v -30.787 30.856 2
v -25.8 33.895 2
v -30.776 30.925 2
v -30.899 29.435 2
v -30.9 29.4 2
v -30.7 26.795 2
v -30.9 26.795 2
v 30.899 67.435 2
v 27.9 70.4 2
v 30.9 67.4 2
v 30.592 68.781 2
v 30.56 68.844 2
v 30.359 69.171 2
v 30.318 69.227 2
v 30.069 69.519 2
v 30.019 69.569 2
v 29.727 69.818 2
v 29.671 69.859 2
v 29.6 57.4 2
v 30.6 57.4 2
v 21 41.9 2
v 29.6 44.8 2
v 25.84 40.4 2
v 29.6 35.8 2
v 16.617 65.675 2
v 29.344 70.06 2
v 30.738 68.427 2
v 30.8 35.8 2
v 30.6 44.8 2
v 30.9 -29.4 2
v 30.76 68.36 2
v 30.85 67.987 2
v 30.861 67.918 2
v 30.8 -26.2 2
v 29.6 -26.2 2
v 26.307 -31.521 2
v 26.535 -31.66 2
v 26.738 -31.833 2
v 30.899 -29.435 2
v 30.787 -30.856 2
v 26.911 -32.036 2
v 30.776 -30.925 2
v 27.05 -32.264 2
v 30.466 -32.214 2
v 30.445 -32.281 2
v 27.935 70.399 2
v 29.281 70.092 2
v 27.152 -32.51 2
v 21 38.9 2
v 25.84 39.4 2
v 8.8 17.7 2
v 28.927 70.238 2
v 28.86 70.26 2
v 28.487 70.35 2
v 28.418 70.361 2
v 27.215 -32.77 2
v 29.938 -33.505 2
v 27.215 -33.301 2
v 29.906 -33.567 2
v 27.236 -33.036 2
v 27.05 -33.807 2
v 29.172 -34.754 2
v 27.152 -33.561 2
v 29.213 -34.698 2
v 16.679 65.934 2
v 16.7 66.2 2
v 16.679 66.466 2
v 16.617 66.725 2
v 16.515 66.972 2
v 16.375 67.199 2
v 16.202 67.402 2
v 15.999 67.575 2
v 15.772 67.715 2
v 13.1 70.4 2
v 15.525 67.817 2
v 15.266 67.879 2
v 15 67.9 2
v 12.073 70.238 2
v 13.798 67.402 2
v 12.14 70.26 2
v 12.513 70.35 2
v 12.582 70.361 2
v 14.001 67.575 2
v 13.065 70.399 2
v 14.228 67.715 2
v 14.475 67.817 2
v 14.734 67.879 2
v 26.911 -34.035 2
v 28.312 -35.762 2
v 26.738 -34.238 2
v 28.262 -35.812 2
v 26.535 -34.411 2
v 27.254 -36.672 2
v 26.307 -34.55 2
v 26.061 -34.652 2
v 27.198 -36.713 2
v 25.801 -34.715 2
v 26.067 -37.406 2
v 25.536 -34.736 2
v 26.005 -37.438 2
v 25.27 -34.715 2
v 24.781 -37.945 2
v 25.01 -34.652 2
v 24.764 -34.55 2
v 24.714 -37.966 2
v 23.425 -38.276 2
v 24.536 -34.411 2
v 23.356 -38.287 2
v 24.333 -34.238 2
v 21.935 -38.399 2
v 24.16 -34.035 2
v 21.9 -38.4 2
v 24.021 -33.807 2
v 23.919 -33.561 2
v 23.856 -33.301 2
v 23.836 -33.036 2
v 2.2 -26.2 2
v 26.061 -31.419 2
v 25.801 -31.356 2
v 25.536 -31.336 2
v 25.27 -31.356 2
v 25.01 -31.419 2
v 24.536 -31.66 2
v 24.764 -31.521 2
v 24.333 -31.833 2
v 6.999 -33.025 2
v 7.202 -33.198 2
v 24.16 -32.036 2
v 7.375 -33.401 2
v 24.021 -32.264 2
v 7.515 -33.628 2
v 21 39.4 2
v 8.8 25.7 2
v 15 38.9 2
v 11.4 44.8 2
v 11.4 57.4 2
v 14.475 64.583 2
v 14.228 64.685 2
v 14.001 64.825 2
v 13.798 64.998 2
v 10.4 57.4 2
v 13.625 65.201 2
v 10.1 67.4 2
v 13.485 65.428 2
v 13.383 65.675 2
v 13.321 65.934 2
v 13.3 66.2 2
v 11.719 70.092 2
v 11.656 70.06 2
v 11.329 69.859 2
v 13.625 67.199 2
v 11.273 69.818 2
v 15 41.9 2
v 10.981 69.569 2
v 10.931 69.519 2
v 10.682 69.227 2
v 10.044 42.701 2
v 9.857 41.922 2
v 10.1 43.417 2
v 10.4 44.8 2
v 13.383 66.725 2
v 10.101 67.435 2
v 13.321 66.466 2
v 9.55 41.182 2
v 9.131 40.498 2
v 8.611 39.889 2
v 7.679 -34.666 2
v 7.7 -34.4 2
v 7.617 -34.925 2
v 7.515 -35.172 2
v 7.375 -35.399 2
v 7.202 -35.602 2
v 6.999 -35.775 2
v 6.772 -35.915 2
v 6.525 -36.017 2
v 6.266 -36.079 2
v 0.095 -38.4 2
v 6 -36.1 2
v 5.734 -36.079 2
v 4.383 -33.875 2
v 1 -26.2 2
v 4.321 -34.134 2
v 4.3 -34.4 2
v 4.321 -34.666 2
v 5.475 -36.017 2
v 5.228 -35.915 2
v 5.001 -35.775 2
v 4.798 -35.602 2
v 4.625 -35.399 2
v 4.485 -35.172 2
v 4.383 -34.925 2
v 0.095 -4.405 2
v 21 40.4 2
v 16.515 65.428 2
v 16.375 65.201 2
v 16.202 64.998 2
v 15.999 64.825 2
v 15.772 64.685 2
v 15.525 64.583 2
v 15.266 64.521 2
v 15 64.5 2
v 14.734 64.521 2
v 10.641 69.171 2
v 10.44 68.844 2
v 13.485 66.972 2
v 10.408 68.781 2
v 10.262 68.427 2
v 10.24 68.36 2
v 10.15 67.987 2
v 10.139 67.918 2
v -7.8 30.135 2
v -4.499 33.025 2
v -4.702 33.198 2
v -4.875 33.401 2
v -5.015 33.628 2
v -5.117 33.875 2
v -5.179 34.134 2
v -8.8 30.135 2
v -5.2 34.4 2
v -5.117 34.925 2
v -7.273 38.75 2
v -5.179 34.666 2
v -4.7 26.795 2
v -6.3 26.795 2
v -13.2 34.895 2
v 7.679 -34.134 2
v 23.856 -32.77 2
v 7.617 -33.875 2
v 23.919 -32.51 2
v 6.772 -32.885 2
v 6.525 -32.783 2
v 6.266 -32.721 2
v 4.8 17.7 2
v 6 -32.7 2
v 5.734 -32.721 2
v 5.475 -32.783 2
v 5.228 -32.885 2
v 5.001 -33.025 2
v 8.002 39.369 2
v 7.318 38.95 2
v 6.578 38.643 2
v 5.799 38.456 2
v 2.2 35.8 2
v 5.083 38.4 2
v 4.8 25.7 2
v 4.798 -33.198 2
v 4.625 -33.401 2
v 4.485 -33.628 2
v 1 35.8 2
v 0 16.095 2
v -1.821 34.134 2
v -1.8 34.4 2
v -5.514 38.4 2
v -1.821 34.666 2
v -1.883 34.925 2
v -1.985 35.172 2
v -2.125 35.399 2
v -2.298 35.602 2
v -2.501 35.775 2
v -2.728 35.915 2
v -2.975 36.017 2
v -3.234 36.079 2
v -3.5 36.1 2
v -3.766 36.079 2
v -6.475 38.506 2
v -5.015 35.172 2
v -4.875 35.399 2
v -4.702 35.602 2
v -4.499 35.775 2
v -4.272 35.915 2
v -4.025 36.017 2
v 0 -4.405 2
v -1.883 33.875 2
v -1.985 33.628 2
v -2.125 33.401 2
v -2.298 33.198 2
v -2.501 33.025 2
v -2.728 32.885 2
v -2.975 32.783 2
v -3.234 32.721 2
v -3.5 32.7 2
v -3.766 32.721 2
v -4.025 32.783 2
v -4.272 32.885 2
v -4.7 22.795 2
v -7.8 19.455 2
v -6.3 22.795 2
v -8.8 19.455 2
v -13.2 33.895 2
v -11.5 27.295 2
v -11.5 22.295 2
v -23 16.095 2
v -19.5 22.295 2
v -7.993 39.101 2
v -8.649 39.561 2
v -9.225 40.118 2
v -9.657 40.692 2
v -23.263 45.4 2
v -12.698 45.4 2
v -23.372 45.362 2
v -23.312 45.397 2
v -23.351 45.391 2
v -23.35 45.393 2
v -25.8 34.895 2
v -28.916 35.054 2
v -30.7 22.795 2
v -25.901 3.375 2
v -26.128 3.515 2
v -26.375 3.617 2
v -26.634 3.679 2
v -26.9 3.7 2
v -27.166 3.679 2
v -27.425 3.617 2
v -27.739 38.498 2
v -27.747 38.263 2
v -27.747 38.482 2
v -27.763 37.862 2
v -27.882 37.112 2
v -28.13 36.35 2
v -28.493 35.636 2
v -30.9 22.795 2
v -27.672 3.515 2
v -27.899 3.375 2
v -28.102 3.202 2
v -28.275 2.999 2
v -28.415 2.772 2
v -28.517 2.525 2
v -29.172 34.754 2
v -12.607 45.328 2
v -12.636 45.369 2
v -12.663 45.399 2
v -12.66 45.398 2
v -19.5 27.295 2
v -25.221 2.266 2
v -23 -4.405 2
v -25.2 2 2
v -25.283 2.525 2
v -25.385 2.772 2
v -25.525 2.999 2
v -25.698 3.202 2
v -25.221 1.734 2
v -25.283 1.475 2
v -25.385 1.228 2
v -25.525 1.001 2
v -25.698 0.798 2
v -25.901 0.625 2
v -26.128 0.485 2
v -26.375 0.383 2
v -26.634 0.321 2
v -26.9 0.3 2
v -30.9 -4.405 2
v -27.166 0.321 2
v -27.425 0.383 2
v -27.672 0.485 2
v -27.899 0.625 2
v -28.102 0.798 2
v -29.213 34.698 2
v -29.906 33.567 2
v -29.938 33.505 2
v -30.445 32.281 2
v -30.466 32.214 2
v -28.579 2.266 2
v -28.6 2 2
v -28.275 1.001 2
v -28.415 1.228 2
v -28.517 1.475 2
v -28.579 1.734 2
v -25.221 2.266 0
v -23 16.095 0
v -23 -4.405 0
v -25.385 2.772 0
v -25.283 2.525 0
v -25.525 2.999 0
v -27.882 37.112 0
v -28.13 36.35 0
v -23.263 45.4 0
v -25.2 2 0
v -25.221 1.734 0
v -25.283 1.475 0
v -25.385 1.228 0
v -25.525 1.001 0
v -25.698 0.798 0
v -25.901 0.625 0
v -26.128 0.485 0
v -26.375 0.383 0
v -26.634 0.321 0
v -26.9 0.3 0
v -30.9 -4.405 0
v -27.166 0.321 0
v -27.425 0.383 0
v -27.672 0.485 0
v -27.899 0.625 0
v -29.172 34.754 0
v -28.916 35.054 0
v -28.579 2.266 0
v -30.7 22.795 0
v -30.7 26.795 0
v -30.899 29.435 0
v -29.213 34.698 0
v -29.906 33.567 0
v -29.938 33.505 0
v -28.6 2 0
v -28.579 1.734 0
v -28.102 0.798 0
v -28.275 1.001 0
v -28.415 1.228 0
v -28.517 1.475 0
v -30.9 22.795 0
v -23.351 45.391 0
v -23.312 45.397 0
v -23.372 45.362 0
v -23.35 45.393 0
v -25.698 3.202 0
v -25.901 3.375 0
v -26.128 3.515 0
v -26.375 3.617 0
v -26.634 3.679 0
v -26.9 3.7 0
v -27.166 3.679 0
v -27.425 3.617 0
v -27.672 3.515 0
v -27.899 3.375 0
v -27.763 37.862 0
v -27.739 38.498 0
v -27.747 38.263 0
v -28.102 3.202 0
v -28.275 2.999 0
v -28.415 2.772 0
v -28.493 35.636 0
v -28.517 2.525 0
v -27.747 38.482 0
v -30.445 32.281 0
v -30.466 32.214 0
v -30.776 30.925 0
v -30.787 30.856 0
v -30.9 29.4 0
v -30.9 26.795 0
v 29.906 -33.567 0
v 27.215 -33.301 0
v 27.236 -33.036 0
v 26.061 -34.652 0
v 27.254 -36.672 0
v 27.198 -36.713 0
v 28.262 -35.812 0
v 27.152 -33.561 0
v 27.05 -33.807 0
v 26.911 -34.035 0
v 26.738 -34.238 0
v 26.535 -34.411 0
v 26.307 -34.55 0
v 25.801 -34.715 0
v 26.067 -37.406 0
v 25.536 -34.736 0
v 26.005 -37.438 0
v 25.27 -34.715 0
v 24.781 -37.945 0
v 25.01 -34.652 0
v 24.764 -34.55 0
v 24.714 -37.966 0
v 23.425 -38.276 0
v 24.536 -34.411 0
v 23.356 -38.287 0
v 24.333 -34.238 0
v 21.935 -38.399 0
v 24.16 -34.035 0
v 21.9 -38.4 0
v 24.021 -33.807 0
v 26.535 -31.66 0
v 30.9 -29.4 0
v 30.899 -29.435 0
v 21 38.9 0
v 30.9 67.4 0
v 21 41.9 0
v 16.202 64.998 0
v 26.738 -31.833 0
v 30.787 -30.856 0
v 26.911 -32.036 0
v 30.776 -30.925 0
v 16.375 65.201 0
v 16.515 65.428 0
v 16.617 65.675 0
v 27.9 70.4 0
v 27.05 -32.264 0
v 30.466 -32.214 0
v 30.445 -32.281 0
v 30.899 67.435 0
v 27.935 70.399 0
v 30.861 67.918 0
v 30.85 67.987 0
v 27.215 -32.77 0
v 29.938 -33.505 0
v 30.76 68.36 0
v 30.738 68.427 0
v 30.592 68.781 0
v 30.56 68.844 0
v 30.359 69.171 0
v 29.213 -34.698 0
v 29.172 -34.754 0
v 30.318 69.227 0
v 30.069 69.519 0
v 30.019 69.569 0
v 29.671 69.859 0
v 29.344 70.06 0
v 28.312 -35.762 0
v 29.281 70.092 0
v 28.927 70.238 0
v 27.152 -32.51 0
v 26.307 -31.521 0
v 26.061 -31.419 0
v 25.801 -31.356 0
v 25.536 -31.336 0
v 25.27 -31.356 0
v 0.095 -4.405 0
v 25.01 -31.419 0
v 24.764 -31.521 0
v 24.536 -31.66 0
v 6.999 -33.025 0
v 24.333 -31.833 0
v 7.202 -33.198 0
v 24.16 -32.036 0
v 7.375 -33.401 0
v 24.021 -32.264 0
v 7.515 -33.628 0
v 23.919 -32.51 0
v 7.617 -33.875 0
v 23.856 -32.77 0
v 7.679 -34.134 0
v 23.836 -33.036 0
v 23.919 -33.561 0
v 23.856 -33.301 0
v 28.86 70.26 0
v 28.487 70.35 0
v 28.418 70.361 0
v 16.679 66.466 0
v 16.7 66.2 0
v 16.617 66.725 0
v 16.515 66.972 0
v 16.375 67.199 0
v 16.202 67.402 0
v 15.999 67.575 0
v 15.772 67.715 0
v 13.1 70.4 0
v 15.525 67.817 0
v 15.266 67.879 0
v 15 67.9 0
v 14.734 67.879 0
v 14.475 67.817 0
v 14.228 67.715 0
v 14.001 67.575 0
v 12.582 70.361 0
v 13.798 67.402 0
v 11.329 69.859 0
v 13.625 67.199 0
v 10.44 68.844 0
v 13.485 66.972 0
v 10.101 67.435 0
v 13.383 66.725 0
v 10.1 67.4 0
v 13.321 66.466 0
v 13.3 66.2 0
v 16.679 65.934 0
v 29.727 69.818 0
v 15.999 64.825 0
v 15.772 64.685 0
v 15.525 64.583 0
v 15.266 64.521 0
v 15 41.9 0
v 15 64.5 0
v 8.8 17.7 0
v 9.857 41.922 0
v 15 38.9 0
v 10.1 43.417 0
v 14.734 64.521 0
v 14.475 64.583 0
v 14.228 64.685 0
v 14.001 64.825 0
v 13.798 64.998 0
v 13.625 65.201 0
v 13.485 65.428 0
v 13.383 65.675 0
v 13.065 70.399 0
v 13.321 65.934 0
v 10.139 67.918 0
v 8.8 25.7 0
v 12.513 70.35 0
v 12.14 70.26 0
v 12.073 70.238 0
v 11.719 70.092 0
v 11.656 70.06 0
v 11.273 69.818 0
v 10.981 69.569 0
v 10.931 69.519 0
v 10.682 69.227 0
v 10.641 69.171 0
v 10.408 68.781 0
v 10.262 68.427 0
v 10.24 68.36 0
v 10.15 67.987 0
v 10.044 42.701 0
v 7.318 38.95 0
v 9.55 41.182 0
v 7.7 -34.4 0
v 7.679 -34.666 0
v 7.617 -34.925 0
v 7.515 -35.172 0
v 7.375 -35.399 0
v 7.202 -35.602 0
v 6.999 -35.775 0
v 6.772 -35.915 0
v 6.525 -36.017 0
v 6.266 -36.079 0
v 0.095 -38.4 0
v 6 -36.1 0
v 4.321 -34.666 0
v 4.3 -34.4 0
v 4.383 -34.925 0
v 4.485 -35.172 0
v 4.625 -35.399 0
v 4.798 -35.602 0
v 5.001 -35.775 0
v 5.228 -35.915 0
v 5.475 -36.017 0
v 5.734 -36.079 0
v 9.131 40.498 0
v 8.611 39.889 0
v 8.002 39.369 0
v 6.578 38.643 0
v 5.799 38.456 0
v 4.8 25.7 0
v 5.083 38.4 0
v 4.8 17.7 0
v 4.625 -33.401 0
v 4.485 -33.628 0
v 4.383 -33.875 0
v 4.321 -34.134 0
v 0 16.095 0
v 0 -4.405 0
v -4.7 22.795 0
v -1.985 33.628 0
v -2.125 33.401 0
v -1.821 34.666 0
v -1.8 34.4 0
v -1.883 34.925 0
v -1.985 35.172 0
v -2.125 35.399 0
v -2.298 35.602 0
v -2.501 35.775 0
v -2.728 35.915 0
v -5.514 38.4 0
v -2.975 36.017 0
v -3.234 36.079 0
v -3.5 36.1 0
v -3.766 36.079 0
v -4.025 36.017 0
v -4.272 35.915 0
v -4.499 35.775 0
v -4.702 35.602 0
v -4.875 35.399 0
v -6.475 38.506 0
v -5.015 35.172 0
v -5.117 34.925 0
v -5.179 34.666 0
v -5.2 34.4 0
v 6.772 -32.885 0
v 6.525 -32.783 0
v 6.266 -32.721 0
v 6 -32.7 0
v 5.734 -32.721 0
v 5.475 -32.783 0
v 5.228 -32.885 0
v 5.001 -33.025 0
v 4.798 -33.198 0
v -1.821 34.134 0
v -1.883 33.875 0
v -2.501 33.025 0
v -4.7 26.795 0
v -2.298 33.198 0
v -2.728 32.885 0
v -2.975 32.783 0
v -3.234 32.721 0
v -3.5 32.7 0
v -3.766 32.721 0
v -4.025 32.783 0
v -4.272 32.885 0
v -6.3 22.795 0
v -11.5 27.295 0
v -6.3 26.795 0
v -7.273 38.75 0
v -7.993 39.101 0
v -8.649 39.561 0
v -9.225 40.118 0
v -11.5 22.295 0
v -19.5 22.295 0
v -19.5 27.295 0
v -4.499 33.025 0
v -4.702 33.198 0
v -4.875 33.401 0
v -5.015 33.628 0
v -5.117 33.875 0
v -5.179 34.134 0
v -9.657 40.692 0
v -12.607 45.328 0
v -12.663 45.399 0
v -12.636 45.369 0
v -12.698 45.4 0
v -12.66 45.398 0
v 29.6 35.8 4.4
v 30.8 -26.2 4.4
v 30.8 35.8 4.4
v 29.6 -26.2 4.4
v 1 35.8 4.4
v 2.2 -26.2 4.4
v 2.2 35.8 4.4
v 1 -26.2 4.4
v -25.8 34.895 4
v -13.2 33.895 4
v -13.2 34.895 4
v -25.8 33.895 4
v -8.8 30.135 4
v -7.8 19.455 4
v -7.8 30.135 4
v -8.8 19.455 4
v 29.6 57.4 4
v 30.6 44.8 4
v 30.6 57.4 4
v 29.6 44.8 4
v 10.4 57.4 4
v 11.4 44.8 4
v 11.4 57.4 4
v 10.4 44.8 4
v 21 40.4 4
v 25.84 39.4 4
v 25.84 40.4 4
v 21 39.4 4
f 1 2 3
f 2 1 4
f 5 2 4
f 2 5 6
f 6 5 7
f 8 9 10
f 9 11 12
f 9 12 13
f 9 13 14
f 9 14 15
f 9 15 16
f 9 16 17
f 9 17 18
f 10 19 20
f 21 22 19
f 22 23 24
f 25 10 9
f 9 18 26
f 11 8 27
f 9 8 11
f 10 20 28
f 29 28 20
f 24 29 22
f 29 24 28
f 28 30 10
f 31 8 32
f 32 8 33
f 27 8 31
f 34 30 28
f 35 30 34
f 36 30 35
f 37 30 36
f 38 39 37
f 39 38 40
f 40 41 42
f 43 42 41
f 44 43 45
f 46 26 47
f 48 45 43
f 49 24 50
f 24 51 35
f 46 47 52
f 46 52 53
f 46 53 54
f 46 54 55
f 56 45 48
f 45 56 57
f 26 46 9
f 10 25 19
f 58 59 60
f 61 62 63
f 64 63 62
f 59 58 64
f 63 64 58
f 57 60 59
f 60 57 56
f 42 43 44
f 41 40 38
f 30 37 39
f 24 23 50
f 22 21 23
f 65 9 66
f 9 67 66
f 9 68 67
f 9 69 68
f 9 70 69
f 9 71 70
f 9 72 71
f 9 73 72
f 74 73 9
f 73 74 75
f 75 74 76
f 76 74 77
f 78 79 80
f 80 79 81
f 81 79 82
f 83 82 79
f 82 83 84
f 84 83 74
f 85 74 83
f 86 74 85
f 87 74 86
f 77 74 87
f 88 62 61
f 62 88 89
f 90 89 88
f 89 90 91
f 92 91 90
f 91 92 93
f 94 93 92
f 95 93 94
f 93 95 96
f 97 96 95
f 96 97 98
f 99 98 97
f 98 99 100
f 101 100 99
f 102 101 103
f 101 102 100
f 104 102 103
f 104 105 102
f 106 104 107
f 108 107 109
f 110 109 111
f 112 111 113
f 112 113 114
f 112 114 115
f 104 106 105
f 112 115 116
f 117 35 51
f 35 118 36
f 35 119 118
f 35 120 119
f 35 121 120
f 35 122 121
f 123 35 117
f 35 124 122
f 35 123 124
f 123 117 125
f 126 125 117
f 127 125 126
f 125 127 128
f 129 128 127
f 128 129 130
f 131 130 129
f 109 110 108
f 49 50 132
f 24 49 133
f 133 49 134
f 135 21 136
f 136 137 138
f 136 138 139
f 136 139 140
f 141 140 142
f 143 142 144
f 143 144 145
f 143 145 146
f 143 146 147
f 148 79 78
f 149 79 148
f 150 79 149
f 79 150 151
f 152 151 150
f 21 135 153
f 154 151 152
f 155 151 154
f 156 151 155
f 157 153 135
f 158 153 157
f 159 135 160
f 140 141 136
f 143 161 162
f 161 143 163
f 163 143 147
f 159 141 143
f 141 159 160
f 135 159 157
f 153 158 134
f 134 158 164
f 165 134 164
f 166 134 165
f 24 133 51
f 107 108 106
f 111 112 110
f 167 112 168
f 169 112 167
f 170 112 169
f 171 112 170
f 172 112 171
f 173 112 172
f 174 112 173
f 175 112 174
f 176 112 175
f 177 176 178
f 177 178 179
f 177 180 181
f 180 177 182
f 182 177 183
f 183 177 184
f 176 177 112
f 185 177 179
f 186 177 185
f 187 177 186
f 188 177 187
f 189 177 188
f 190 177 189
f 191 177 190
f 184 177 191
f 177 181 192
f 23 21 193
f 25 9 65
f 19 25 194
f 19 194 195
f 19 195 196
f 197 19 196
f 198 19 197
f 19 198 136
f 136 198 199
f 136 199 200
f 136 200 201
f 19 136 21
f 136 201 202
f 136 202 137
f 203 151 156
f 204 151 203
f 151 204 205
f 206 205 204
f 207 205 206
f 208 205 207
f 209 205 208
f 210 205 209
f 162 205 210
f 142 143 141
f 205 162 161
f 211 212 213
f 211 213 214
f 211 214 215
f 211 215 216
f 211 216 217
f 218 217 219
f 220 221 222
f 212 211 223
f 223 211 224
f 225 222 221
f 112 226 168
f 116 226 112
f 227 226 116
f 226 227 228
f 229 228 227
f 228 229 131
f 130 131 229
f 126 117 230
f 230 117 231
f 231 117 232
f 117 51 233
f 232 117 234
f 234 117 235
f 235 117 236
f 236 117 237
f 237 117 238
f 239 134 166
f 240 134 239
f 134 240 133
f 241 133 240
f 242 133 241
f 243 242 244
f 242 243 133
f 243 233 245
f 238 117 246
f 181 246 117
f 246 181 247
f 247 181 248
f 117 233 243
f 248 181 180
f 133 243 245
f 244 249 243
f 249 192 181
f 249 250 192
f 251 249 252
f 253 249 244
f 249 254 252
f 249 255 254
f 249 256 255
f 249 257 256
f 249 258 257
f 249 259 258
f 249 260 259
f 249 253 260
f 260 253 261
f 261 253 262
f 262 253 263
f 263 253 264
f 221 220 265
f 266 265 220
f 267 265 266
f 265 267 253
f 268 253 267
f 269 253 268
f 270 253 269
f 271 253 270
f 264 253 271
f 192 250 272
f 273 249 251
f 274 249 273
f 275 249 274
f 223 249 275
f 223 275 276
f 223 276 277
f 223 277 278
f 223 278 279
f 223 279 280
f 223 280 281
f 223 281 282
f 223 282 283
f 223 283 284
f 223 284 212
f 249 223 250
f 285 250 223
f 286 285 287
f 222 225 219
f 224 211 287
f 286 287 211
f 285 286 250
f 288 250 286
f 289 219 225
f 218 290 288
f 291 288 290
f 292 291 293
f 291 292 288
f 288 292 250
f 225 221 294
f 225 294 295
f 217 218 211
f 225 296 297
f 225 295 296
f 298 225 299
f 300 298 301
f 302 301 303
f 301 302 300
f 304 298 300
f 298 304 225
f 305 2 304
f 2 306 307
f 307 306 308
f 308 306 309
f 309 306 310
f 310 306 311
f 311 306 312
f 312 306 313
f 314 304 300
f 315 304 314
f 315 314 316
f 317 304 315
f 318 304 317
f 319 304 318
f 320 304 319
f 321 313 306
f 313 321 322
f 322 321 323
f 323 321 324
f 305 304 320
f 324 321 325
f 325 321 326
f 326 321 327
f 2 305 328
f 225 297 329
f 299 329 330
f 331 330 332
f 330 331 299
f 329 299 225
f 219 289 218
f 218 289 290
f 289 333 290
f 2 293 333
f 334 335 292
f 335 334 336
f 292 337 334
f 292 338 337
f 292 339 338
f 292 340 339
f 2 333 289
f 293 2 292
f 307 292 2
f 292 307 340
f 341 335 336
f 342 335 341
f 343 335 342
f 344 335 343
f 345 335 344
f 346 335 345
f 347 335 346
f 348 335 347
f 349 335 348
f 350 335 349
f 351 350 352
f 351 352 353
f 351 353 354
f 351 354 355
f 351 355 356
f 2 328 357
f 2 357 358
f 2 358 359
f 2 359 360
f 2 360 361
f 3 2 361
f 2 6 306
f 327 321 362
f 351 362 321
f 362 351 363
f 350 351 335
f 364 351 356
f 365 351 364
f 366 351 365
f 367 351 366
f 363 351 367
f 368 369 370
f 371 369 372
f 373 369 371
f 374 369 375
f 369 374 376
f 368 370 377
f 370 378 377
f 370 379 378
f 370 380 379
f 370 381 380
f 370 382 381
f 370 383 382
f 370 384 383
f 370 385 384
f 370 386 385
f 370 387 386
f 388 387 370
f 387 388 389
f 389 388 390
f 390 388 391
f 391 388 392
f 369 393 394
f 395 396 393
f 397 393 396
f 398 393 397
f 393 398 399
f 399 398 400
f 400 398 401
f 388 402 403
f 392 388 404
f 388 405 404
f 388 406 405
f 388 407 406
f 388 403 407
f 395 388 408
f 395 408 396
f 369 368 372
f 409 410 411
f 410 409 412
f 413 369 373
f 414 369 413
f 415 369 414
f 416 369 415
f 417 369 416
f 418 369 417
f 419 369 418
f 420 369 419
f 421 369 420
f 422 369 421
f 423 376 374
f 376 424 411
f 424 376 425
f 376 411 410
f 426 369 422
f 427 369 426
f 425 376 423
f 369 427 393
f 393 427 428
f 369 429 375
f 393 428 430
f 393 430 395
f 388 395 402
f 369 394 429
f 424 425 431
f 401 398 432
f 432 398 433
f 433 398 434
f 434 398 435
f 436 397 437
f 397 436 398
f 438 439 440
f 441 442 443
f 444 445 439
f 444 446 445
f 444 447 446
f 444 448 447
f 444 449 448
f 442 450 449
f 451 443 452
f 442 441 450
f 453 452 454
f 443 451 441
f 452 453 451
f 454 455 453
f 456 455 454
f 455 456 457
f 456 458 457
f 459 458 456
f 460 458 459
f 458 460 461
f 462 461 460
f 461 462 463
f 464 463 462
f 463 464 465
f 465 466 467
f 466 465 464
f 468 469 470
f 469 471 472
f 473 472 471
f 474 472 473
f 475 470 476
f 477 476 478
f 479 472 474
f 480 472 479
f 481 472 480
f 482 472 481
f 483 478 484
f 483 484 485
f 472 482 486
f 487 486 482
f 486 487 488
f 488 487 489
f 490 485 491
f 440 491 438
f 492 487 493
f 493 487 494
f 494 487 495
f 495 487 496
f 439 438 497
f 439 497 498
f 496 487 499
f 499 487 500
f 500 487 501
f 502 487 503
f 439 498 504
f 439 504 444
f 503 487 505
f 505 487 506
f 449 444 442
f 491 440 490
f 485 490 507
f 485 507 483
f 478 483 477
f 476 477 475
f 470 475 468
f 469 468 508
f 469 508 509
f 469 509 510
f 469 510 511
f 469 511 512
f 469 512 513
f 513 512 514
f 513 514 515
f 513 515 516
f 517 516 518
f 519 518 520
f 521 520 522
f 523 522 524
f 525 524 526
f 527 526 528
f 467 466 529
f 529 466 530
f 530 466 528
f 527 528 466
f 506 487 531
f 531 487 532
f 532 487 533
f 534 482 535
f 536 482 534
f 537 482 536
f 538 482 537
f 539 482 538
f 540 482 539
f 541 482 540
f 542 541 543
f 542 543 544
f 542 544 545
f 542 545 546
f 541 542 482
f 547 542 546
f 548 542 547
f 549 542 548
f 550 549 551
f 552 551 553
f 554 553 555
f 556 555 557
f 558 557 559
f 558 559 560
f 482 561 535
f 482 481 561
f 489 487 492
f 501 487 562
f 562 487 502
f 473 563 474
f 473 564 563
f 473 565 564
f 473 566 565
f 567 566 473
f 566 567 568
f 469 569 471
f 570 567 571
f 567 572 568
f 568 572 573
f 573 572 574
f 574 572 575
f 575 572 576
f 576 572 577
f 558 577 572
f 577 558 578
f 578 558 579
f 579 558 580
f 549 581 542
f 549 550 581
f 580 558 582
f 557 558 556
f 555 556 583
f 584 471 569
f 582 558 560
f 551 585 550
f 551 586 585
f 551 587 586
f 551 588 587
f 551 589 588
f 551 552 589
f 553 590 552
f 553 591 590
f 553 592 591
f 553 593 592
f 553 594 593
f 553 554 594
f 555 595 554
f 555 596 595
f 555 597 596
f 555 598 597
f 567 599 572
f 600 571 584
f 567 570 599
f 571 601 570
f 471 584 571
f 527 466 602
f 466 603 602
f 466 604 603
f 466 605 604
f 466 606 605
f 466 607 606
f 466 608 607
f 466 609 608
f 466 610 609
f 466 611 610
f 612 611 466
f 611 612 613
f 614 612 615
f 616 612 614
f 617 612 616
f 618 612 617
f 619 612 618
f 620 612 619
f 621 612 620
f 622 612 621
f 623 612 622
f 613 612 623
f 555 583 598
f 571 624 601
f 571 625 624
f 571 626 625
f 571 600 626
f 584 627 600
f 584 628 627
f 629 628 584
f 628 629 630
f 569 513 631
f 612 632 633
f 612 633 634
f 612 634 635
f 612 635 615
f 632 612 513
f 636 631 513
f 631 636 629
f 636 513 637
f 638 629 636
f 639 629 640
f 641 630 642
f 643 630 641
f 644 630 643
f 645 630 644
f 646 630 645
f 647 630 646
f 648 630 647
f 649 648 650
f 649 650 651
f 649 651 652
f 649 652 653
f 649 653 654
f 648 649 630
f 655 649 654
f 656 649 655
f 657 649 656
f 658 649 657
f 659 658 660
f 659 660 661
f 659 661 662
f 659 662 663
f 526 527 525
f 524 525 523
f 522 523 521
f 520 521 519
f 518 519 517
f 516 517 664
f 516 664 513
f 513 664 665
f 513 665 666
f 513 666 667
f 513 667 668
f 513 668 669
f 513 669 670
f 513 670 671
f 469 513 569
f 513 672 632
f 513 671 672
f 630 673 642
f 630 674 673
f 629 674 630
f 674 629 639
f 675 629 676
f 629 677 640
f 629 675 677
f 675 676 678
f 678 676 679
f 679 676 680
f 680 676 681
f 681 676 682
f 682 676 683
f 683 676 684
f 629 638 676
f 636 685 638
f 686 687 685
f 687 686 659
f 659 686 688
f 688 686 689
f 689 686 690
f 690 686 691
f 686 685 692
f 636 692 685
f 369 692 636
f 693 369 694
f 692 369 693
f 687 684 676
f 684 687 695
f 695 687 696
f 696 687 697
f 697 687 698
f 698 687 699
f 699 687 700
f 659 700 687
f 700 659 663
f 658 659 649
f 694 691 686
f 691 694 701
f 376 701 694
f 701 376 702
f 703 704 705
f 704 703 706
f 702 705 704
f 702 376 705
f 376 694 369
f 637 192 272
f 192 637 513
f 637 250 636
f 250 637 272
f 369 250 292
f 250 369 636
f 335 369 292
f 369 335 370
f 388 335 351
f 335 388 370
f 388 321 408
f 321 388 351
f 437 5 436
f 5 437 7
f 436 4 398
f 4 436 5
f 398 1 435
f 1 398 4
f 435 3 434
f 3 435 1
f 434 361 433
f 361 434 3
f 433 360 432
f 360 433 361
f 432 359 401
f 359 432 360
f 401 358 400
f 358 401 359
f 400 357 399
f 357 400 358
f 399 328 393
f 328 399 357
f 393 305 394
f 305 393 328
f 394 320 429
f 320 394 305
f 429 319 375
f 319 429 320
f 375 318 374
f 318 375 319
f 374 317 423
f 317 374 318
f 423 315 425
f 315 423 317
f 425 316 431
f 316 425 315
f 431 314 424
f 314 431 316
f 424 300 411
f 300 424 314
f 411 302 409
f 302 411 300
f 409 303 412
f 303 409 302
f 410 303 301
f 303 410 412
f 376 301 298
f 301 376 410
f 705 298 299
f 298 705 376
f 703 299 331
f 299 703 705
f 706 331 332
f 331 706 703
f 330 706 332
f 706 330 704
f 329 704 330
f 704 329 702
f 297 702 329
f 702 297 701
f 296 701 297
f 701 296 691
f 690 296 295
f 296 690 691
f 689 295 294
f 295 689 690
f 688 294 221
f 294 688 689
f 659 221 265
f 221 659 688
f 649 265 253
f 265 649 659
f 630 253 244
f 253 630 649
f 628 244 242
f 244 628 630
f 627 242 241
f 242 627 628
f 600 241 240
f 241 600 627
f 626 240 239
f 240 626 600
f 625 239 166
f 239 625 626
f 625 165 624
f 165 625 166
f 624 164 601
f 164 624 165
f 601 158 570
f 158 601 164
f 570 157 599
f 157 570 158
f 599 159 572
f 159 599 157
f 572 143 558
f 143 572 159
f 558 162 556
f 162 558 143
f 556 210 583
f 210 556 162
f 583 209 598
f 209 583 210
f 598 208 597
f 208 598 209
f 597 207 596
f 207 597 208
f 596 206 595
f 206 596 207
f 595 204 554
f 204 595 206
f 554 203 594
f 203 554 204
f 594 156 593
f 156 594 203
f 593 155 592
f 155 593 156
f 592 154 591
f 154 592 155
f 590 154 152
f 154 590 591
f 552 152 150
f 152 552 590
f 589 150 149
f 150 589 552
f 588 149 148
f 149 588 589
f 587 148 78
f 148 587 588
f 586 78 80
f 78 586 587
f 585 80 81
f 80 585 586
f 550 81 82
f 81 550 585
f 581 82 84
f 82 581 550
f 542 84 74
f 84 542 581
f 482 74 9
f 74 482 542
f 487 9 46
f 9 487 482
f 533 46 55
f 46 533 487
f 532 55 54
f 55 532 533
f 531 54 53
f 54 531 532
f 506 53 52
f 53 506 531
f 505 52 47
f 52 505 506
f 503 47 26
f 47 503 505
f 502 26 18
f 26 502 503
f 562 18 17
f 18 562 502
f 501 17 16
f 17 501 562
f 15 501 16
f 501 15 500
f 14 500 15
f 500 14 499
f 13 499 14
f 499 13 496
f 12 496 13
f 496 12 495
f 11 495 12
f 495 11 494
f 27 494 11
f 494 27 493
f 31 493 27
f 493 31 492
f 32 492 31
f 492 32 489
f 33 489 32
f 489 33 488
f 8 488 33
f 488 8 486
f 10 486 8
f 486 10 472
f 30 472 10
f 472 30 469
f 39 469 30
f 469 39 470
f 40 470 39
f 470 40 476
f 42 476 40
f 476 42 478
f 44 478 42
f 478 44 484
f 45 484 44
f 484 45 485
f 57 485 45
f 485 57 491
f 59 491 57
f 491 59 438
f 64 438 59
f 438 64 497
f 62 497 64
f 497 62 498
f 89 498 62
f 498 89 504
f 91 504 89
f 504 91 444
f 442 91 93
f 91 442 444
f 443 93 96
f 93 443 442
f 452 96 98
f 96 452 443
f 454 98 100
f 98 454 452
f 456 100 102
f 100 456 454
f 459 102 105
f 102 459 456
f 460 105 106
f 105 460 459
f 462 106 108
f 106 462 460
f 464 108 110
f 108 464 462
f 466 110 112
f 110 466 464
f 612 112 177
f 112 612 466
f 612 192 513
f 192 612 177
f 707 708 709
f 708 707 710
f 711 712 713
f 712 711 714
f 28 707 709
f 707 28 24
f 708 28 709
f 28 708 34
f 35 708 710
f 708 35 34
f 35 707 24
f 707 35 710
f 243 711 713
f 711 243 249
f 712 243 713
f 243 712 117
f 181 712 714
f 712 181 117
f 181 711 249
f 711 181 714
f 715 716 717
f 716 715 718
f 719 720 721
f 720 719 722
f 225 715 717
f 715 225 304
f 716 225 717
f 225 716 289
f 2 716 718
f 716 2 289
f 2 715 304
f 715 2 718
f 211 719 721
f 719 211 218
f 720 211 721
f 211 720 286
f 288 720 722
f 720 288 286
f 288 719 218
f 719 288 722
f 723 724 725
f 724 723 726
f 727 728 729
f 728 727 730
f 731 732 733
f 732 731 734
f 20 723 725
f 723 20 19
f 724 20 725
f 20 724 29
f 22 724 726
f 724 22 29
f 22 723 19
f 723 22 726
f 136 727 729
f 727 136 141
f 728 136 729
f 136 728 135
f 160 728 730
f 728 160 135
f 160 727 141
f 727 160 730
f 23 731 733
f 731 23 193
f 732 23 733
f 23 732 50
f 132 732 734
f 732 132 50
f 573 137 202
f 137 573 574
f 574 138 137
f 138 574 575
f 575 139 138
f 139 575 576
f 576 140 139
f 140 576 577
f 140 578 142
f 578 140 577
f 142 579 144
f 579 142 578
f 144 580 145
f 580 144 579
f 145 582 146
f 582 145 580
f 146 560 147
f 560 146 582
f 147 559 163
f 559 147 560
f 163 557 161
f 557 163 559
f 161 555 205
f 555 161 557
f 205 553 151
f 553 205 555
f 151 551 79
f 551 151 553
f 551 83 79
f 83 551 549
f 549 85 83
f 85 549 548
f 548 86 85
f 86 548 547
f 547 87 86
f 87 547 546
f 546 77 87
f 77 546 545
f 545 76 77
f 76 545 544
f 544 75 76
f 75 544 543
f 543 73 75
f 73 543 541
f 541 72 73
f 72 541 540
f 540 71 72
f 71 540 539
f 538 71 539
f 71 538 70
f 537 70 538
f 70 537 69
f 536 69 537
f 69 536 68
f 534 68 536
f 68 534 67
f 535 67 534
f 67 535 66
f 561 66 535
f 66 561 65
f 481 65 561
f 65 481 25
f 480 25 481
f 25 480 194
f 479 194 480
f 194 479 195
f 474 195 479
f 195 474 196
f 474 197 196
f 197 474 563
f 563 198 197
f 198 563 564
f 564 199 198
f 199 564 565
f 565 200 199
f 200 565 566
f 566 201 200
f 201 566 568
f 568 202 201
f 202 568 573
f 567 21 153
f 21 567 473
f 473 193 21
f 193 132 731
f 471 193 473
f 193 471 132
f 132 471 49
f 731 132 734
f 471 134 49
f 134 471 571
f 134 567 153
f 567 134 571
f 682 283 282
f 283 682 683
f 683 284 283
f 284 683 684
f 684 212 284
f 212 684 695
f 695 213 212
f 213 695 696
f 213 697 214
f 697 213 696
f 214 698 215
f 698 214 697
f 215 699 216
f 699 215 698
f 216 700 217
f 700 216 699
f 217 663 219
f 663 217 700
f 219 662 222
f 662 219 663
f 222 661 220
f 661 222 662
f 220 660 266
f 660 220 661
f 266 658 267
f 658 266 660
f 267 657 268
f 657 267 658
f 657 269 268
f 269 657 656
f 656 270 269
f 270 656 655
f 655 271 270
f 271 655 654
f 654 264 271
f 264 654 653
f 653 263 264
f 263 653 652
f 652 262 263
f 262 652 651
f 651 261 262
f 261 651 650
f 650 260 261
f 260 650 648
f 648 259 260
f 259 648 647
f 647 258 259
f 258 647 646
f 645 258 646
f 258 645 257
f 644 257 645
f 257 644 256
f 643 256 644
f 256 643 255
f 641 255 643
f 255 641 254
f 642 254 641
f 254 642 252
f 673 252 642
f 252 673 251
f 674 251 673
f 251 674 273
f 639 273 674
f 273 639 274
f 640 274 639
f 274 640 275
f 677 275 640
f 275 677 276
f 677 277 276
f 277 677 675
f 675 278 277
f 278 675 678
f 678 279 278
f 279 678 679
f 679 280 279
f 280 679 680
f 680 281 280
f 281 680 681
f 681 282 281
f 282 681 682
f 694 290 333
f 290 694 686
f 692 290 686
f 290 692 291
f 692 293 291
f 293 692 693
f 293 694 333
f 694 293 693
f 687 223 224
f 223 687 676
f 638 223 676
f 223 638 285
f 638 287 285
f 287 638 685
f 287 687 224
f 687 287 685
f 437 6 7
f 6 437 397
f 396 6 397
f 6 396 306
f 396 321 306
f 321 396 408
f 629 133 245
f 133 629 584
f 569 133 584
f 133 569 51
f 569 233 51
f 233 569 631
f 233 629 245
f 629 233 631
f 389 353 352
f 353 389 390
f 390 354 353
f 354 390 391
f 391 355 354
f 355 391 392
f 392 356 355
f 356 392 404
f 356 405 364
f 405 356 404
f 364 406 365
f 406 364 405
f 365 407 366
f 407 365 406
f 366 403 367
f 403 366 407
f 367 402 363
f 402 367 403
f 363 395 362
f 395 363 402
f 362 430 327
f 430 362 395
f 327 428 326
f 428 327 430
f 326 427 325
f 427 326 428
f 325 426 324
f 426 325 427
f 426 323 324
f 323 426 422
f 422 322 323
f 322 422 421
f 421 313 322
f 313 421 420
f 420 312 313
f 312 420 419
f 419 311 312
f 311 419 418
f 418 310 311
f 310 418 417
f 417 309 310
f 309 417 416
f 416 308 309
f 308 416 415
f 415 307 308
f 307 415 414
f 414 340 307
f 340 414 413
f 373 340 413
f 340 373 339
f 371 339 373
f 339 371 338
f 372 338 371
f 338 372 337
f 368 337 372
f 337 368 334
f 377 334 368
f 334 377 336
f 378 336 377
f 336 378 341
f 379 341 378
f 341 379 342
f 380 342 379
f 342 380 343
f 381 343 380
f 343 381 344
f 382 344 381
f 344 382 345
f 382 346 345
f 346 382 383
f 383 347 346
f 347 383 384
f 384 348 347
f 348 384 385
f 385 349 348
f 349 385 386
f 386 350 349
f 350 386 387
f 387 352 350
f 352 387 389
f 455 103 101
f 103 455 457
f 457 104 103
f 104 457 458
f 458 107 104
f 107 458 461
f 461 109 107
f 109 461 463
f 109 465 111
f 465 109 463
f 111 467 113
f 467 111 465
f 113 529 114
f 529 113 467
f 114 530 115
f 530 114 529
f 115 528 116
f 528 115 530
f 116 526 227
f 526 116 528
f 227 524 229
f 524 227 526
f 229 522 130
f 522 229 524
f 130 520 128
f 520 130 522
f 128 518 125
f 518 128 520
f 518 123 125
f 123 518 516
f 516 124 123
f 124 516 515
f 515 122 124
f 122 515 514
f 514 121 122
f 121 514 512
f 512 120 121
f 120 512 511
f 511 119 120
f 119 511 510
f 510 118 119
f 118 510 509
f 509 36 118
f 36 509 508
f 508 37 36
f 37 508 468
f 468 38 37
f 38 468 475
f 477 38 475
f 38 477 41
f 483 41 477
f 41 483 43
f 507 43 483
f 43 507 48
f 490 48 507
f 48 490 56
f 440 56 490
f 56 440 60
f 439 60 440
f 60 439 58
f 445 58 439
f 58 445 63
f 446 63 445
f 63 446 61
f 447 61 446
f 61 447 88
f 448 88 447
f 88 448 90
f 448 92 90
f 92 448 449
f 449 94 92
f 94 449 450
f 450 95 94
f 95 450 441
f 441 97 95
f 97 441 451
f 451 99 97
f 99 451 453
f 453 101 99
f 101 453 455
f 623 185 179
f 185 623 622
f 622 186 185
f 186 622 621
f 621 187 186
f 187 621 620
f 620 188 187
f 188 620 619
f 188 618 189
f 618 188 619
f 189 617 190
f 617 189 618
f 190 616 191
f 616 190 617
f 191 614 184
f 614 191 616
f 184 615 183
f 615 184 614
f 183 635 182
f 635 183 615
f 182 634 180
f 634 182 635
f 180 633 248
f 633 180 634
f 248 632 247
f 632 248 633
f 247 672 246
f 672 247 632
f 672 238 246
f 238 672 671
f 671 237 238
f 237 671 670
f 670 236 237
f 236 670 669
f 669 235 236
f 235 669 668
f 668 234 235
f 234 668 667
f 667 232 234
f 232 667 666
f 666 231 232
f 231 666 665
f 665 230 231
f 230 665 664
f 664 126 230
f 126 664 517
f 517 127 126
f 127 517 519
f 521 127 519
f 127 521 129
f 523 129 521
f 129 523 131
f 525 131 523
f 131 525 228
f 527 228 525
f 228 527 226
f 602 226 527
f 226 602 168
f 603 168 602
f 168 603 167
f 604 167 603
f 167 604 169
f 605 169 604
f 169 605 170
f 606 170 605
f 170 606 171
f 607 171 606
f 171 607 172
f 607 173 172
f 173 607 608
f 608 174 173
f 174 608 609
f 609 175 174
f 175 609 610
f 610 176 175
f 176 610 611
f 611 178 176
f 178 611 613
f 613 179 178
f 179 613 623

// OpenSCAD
include <../lib/eink-dual-lora-case-lib.scad>;
$fn = 40;
midframe_part();
